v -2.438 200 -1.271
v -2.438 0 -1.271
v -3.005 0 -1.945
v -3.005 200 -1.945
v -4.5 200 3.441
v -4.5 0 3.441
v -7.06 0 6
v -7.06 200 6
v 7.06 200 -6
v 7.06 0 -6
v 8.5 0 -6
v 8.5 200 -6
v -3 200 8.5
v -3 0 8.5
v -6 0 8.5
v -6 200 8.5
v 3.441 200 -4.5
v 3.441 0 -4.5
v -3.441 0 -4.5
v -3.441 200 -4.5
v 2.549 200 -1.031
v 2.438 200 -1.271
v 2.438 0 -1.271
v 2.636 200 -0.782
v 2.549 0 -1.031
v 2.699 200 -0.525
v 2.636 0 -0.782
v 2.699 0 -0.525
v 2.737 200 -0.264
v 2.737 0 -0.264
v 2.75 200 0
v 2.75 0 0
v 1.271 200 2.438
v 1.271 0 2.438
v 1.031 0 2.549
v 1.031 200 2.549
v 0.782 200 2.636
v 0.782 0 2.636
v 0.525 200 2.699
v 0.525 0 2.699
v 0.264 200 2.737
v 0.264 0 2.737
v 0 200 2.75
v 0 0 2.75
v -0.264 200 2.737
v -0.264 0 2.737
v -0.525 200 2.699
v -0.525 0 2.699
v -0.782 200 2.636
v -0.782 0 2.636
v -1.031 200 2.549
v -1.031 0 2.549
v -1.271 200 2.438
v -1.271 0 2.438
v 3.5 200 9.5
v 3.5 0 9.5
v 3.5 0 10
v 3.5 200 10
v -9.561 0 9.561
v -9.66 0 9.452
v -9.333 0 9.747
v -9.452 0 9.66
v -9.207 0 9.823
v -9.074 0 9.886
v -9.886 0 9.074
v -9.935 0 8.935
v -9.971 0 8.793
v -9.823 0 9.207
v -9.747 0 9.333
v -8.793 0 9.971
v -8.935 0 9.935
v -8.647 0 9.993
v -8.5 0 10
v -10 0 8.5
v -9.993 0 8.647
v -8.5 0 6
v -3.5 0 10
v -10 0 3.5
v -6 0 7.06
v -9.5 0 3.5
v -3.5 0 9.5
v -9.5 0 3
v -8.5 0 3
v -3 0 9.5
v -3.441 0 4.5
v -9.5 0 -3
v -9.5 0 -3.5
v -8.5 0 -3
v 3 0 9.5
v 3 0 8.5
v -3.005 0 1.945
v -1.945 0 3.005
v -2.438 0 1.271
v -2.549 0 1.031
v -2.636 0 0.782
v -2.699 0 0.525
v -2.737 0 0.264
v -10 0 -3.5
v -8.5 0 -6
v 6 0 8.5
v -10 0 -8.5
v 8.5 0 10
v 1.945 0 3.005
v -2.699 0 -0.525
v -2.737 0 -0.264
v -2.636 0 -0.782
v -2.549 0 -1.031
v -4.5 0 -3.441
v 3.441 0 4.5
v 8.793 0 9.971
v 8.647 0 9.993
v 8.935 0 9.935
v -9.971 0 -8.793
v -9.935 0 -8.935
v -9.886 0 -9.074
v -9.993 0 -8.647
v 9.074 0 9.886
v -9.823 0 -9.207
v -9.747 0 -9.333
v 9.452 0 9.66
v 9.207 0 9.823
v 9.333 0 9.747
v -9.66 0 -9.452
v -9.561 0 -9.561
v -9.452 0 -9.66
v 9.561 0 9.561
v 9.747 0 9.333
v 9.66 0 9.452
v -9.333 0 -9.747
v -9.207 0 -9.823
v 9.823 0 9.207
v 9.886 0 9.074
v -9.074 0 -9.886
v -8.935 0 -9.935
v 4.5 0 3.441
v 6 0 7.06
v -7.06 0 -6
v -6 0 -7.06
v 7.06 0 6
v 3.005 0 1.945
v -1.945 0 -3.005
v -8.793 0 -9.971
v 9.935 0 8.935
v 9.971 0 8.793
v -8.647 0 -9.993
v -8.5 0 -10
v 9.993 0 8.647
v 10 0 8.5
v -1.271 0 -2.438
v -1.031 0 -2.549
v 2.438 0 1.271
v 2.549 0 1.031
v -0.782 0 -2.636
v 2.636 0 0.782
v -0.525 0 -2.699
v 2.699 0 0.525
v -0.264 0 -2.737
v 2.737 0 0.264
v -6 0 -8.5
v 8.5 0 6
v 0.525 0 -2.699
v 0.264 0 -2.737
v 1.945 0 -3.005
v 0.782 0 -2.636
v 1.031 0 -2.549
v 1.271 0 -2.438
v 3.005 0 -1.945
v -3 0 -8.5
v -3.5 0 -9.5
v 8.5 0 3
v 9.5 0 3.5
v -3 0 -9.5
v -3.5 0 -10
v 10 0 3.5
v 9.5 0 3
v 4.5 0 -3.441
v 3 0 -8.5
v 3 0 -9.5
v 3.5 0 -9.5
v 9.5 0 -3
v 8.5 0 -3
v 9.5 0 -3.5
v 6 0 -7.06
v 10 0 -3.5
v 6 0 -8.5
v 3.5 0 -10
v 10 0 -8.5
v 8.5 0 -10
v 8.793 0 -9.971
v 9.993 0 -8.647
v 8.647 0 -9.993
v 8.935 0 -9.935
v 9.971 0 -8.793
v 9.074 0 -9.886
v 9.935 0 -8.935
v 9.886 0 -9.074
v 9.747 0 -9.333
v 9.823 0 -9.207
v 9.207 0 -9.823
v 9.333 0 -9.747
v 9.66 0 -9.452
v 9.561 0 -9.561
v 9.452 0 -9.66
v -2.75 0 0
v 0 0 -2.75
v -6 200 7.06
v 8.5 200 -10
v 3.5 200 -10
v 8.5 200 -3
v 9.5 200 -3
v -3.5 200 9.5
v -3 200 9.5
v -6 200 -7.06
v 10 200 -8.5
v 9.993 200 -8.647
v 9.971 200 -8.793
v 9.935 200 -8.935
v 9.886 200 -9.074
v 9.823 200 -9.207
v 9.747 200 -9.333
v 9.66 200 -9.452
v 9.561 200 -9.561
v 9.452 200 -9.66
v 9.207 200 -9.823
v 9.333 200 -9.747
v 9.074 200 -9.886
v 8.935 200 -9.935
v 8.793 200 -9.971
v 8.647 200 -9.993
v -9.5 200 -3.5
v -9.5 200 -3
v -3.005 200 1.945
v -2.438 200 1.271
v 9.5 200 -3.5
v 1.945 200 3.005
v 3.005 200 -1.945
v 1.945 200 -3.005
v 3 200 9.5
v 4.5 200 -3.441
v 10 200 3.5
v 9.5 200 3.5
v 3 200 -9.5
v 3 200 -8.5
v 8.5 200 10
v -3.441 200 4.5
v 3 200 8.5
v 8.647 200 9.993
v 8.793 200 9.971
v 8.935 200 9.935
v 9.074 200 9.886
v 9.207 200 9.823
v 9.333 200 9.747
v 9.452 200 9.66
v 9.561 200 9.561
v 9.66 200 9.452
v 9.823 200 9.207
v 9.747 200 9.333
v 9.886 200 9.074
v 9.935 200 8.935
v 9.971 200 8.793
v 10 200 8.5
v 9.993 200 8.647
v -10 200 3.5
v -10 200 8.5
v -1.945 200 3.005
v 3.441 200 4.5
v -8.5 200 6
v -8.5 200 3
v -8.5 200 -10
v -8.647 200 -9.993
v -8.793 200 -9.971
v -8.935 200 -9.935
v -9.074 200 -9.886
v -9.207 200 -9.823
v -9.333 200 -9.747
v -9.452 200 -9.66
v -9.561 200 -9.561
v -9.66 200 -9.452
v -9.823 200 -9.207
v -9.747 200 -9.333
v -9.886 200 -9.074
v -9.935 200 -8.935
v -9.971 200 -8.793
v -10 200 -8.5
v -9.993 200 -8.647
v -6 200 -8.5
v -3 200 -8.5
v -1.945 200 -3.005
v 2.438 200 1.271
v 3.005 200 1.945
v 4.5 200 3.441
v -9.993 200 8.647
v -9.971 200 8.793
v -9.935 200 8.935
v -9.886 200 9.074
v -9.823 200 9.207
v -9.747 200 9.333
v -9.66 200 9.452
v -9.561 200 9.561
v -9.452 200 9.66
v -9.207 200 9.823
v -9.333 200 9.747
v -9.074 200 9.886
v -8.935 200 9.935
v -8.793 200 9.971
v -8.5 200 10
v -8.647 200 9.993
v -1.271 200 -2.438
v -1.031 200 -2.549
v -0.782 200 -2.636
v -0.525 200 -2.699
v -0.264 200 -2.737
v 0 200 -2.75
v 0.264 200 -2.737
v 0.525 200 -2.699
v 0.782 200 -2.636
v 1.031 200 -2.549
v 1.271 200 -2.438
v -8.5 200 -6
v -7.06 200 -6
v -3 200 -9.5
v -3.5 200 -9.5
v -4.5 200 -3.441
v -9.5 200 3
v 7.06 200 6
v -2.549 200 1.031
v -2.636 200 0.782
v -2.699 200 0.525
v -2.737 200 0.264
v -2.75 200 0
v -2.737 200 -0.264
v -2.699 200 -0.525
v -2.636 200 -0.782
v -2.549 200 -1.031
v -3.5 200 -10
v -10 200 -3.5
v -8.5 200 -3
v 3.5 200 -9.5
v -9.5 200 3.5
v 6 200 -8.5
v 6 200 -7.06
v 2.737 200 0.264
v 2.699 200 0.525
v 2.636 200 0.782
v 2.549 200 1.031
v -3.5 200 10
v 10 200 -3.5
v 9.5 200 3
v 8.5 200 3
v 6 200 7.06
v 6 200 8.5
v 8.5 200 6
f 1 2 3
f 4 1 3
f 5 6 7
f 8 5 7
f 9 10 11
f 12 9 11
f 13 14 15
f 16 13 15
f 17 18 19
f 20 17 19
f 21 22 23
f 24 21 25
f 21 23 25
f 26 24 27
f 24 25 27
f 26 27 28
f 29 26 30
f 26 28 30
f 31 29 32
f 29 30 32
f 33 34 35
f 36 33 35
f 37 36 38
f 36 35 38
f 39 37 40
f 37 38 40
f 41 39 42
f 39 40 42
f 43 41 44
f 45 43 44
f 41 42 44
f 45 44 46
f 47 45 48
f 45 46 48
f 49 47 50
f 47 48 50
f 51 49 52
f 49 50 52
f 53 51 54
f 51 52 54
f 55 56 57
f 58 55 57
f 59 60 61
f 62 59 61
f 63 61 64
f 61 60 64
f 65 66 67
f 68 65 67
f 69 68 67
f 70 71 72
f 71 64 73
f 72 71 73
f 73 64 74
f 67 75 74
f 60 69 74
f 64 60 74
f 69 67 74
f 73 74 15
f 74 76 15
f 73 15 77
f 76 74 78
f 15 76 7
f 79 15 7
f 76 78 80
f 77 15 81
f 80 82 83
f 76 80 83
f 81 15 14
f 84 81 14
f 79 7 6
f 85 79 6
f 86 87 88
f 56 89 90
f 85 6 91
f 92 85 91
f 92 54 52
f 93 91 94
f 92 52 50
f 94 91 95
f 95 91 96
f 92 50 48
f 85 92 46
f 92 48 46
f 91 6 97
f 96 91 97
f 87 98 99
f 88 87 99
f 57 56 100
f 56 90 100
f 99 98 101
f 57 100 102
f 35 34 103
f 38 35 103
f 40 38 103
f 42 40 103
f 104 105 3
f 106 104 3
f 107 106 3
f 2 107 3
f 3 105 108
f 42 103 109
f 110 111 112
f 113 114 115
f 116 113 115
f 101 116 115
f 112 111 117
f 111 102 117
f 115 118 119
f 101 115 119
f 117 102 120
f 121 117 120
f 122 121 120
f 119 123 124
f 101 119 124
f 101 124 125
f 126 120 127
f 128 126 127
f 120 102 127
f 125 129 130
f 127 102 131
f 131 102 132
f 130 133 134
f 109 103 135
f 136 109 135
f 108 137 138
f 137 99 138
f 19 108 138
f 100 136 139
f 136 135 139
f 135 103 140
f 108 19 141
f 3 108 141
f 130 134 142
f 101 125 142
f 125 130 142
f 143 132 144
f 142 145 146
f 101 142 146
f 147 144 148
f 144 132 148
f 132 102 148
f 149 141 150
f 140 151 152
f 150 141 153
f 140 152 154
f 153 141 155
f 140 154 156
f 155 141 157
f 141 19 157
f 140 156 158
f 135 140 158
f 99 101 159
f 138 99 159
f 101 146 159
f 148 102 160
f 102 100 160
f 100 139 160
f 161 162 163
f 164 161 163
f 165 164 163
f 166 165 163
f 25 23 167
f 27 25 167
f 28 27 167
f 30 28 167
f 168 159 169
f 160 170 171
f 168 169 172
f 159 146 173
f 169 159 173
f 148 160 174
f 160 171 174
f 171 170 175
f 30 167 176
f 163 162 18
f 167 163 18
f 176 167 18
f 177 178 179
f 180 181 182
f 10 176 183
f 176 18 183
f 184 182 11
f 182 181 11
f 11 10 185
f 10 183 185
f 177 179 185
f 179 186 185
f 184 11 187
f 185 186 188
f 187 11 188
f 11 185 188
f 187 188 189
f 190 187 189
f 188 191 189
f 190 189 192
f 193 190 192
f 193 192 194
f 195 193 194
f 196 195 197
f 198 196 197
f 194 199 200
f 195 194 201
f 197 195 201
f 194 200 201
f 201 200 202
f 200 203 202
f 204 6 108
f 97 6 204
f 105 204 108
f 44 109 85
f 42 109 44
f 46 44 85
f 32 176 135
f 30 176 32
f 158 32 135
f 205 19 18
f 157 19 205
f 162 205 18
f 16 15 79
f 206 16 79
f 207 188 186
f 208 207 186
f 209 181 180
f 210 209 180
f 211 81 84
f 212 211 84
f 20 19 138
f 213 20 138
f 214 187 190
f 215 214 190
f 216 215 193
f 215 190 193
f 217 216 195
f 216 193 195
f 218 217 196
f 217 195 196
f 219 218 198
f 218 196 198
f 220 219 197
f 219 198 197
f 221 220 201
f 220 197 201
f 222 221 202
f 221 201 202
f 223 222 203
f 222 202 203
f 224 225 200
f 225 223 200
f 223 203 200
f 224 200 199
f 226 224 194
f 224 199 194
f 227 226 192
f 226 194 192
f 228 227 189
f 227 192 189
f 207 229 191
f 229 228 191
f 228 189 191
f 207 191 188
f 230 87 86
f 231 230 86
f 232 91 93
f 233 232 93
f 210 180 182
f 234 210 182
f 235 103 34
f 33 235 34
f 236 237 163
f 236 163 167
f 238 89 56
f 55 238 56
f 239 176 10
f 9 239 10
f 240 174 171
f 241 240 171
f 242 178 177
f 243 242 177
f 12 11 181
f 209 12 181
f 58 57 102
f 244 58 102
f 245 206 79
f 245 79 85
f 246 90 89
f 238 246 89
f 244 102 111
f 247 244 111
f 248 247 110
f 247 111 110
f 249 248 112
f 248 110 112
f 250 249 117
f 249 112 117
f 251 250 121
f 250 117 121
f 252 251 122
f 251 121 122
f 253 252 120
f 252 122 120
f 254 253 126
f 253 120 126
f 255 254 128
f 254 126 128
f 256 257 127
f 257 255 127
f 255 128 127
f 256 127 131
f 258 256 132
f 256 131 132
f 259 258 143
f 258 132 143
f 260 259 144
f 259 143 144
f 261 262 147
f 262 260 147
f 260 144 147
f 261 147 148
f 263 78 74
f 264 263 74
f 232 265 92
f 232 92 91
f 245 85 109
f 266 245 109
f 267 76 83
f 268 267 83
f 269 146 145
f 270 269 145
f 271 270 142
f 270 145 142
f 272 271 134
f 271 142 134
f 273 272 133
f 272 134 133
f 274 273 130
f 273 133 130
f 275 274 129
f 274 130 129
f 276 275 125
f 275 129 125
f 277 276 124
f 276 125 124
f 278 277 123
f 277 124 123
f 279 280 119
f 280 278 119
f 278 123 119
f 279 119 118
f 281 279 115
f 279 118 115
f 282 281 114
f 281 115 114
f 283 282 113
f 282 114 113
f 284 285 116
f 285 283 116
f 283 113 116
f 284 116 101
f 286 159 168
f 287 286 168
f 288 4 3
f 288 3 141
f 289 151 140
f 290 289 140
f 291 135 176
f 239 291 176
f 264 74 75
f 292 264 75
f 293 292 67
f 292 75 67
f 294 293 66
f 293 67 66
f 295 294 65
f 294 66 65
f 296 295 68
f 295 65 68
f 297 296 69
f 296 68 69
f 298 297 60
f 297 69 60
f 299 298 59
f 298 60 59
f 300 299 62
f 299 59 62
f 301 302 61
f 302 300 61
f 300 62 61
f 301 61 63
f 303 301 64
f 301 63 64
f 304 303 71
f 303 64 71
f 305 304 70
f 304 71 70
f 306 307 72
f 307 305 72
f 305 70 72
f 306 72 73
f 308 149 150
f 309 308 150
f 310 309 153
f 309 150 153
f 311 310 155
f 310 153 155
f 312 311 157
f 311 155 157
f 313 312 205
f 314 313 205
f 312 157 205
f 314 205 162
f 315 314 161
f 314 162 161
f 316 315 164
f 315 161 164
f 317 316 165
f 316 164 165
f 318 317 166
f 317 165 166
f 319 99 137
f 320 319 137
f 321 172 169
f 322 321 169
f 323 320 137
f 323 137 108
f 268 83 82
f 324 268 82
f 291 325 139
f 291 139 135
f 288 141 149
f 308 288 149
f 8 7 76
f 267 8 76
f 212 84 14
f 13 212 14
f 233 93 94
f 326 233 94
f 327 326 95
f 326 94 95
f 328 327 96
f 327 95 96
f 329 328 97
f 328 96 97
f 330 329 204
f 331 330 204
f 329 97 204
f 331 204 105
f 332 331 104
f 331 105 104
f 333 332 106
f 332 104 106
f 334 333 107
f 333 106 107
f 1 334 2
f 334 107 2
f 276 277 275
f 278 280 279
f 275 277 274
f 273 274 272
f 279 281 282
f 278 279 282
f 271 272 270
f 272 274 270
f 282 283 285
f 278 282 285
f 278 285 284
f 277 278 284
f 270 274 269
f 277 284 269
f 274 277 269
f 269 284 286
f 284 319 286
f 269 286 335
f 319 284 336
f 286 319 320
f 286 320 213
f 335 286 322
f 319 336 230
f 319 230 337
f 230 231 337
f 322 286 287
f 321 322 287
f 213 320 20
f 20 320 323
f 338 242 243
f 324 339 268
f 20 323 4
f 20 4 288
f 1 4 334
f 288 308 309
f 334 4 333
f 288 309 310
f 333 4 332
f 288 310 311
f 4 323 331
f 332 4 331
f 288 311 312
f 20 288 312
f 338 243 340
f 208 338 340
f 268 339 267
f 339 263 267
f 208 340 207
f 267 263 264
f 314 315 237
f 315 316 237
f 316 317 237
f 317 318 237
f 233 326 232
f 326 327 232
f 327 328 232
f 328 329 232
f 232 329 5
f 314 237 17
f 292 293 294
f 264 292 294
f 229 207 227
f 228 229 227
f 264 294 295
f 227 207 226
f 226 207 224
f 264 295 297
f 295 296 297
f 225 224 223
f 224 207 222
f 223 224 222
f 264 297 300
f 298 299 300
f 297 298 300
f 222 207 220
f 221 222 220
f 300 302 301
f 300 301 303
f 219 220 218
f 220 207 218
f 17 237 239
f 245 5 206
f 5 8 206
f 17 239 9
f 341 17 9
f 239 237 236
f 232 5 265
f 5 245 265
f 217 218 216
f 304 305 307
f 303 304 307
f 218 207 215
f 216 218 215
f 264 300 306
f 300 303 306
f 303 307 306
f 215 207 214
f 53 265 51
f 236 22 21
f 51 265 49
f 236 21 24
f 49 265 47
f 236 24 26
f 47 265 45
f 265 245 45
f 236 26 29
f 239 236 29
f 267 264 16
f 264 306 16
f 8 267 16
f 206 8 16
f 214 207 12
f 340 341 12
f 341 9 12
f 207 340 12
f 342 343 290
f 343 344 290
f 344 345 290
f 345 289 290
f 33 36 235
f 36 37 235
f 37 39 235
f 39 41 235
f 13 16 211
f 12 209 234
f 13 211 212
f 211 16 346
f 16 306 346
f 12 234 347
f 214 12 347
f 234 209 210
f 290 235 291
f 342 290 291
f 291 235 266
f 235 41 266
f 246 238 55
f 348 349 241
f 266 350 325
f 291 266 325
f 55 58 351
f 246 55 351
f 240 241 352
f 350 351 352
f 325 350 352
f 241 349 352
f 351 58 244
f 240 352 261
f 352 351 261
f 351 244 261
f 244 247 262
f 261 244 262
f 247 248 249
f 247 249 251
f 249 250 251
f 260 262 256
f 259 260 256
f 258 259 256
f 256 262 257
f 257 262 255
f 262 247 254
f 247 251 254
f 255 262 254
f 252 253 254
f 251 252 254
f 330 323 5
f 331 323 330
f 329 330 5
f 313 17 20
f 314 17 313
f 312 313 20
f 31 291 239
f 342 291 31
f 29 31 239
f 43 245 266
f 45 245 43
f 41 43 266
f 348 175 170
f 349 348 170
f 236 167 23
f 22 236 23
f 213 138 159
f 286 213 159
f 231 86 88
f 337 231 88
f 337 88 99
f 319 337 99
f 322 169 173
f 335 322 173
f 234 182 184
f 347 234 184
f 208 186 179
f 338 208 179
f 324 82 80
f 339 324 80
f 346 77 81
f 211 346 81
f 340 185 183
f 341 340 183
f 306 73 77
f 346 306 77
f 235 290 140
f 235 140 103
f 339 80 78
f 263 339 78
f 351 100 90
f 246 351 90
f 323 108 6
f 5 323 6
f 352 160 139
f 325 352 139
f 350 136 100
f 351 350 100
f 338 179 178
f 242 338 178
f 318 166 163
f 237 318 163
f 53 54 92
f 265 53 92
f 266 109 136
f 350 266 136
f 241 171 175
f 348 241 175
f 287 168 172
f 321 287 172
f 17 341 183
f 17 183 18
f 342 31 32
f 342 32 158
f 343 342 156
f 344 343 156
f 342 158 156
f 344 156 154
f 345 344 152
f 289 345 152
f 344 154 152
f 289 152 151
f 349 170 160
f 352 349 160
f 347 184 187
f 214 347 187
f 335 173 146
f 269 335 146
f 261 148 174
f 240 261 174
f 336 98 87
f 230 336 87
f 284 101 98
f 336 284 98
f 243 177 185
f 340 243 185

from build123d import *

# Parameters (mm, degrees)
DODANIE_WYCI_GNI_CIE1_DEPTH     = 807
SCHNITT_LINEAR_AUSTRAGEN1_DEPTH = 20


with BuildPart() as part:
    # Szkic1 → Dodanie-wyciągnięcie1 (new body)
    with BuildSketch(Plane(origin=(0, 0, 0), x_dir=(1, 0, 0), z_dir=(0, 1, 0))):
        with BuildLine():
            Line((-7.06, 6), (-4.5, 3.440546933))
            Line((-4.5, 3.440546933), (-4.5, 4.5))
            Line((-4.5, 4.5), (-3.440546933, 4.5))
            Line((-3.440546933, 4.5), (-6, 7.06))
            Line((-6, 7.06), (-6, 8.5))
            Line((-6, 8.5), (-3, 8.5))
            Line((-3, 8.5), (-3, 9.5))
            Line((-3, 9.5), (-3.5, 9.5))
            Line((-3.5, 9.5), (-3.5, 10))
            Line((-3.5, 10), (-8.5, 10))
            ThreePointArc((-8.5, 10), (-9.560660172, 9.560660172), (-10, 8.5))
            Line((-10, 8.5), (-10, 3.5))
            Line((-10, 3.5), (-9.5, 3.5))
            Line((-9.5, 3.5), (-9.5, 3))
            Line((-9.5, 3), (-8.5, 3))
            Line((-8.5, 3), (-8.5, 6))
            Line((-8.5, 6), (-7.06, 6))
        make_face()
        with BuildLine():
            Line((4.5, 4.5), (4.5, 3.440546933))
            Line((4.5, 3.440546933), (7.06, 6))
            Line((7.06, 6), (8.5, 6))
            Line((8.5, 6), (8.5, 3))
            Line((8.5, 3), (9.5, 3))
            Line((9.5, 3), (9.5, 3.5))
            Line((9.5, 3.5), (10, 3.5))
            Line((10, 3.5), (10, 8.5))
            ThreePointArc((10, 8.5), (9.560660172, 9.560660172), (8.5, 10))
            Line((8.5, 10), (3.5, 10))
            Line((3.5, 10), (3.5, 9.5))
            Line((3.5, 9.5), (3, 9.5))
            Line((3, 9.5), (3, 8.5))
            Line((3, 8.5), (6, 8.5))
            Line((6, 8.5), (6, 7.06))
            Line((6, 7.06), (3.440546933, 4.5))
            Line((3.440546933, 4.5), (4.5, 4.5))
        make_face()
        Polygon((3.440546933, -4.5), (4.5, -4.5), (4.5, -3.440546933), (4.5, 3.440546933), (4.5, 4.5), (3.440546933, 4.5), (-3.440546933, 4.5), (-4.5, 4.5), (-4.5, 3.440546933), (-4.5, -3.440546933), (-4.5, -4.5), (-3.440546933, -4.5), align=None)
        with BuildLine():
            Line((-3.00520382, 1.944543648), (-1.944543648, 3.00520382))
            Line((-1.944543648, 3.00520382), (-1.271309214, 2.438498079))
            ThreePointArc((-1.271309214, 2.438498079), (0, 2.75), (1.271309214, 2.438498079))
            Line((1.271309214, 2.438498079), (1.944543648, 3.00520382))
            Line((1.944543648, 3.00520382), (3.00520382, 1.944543648))
            Line((3.00520382, 1.944543648), (2.438498079, 1.271309214))
            ThreePointArc((2.438498079, 1.271309214), (2.670989491, 0.654457899), (2.75, 0))
            ThreePointArc((2.75, 0), (2.670989491, -0.654457899), (2.438498079, -1.271309214))
            Line((2.438498079, -1.271309214), (3.00520382, -1.944543648))
            Line((3.00520382, -1.944543648), (1.944543648, -3.00520382))
            Line((1.944543648, -3.00520382), (1.271309214, -2.438498079))
            ThreePointArc((1.271309214, -2.438498079), (0, -2.75), (-1.271309214, -2.438498079))
            Line((-1.271309214, -2.438498079), (-1.944543648, -3.00520382))
            Line((-1.944543648, -3.00520382), (-3.00520382, -1.944543648))
            Line((-3.00520382, -1.944543648), (-2.438498079, -1.271309214))
            ThreePointArc((-2.438498079, -1.271309214), (-2.75, 0), (-2.438498079, 1.271309214))
            Line((-2.438498079, 1.271309214), (-3.00520382, 1.944543648))
        make_face(mode=Mode.SUBTRACT)
        with BuildLine():
            Line((-6, -7.06), (-3.440546933, -4.5))
            Line((-3.440546933, -4.5), (-4.5, -4.5))
            Line((-4.5, -4.5), (-4.5, -3.440546933))
            Line((-4.5, -3.440546933), (-7.06, -6))
            Line((-7.06, -6), (-8.5, -6))
            Line((-8.5, -6), (-8.5, -3))
            Line((-8.5, -3), (-9.5, -3))
            Line((-9.5, -3), (-9.5, -3.5))
            Line((-9.5, -3.5), (-10, -3.5))
            Line((-10, -3.5), (-10, -8.5))
            ThreePointArc((-10, -8.5), (-9.560660172, -9.560660172), (-8.5, -10))
            Line((-8.5, -10), (-3.5, -10))
            Line((-3.5, -10), (-3.5, -9.5))
            Line((-3.5, -9.5), (-3, -9.5))
            Line((-3, -9.5), (-3, -8.5))
            Line((-3, -8.5), (-6, -8.5))
            Line((-6, -8.5), (-6, -7.06))
        make_face()
        with BuildLine():
            Line((4.5, -3.440546933), (4.5, -4.5))
            Line((4.5, -4.5), (3.440546933, -4.5))
            Line((3.440546933, -4.5), (6, -7.06))
            Line((6, -7.06), (6, -8.5))
            Line((6, -8.5), (3, -8.5))
            Line((3, -8.5), (3, -9.5))
            Line((3, -9.5), (3.5, -9.5))
            Line((3.5, -9.5), (3.5, -10))
            Line((3.5, -10), (8.5, -10))
            ThreePointArc((8.5, -10), (9.560660172, -9.560660172), (10, -8.5))
            Line((10, -8.5), (10, -3.5))
            Line((10, -3.5), (9.5, -3.5))
            Line((9.5, -3.5), (9.5, -3))
            Line((9.5, -3), (8.5, -3))
            Line((8.5, -3), (8.5, -6))
            Line((8.5, -6), (7.06, -6))
            Line((7.06, -6), (4.5, -3.440546933))
        make_face()
    extrude(amount=DODANIE_WYCI_GNI_CIE1_DEPTH)

    # Skizze1 → Schnitt-Linear austragen1 (cut, symmetric)
    with BuildSketch(Plane.XY):
        Polygon((-83.496312338, 200), (63.910757592, 200), (55.14879889, 860.754768005), (-83.496312338, 858.91626029), align=None)
    extrude(amount=SCHNITT_LINEAR_AUSTRAGEN1_DEPTH, both=True, mode=Mode.SUBTRACT)


solid = part.part
